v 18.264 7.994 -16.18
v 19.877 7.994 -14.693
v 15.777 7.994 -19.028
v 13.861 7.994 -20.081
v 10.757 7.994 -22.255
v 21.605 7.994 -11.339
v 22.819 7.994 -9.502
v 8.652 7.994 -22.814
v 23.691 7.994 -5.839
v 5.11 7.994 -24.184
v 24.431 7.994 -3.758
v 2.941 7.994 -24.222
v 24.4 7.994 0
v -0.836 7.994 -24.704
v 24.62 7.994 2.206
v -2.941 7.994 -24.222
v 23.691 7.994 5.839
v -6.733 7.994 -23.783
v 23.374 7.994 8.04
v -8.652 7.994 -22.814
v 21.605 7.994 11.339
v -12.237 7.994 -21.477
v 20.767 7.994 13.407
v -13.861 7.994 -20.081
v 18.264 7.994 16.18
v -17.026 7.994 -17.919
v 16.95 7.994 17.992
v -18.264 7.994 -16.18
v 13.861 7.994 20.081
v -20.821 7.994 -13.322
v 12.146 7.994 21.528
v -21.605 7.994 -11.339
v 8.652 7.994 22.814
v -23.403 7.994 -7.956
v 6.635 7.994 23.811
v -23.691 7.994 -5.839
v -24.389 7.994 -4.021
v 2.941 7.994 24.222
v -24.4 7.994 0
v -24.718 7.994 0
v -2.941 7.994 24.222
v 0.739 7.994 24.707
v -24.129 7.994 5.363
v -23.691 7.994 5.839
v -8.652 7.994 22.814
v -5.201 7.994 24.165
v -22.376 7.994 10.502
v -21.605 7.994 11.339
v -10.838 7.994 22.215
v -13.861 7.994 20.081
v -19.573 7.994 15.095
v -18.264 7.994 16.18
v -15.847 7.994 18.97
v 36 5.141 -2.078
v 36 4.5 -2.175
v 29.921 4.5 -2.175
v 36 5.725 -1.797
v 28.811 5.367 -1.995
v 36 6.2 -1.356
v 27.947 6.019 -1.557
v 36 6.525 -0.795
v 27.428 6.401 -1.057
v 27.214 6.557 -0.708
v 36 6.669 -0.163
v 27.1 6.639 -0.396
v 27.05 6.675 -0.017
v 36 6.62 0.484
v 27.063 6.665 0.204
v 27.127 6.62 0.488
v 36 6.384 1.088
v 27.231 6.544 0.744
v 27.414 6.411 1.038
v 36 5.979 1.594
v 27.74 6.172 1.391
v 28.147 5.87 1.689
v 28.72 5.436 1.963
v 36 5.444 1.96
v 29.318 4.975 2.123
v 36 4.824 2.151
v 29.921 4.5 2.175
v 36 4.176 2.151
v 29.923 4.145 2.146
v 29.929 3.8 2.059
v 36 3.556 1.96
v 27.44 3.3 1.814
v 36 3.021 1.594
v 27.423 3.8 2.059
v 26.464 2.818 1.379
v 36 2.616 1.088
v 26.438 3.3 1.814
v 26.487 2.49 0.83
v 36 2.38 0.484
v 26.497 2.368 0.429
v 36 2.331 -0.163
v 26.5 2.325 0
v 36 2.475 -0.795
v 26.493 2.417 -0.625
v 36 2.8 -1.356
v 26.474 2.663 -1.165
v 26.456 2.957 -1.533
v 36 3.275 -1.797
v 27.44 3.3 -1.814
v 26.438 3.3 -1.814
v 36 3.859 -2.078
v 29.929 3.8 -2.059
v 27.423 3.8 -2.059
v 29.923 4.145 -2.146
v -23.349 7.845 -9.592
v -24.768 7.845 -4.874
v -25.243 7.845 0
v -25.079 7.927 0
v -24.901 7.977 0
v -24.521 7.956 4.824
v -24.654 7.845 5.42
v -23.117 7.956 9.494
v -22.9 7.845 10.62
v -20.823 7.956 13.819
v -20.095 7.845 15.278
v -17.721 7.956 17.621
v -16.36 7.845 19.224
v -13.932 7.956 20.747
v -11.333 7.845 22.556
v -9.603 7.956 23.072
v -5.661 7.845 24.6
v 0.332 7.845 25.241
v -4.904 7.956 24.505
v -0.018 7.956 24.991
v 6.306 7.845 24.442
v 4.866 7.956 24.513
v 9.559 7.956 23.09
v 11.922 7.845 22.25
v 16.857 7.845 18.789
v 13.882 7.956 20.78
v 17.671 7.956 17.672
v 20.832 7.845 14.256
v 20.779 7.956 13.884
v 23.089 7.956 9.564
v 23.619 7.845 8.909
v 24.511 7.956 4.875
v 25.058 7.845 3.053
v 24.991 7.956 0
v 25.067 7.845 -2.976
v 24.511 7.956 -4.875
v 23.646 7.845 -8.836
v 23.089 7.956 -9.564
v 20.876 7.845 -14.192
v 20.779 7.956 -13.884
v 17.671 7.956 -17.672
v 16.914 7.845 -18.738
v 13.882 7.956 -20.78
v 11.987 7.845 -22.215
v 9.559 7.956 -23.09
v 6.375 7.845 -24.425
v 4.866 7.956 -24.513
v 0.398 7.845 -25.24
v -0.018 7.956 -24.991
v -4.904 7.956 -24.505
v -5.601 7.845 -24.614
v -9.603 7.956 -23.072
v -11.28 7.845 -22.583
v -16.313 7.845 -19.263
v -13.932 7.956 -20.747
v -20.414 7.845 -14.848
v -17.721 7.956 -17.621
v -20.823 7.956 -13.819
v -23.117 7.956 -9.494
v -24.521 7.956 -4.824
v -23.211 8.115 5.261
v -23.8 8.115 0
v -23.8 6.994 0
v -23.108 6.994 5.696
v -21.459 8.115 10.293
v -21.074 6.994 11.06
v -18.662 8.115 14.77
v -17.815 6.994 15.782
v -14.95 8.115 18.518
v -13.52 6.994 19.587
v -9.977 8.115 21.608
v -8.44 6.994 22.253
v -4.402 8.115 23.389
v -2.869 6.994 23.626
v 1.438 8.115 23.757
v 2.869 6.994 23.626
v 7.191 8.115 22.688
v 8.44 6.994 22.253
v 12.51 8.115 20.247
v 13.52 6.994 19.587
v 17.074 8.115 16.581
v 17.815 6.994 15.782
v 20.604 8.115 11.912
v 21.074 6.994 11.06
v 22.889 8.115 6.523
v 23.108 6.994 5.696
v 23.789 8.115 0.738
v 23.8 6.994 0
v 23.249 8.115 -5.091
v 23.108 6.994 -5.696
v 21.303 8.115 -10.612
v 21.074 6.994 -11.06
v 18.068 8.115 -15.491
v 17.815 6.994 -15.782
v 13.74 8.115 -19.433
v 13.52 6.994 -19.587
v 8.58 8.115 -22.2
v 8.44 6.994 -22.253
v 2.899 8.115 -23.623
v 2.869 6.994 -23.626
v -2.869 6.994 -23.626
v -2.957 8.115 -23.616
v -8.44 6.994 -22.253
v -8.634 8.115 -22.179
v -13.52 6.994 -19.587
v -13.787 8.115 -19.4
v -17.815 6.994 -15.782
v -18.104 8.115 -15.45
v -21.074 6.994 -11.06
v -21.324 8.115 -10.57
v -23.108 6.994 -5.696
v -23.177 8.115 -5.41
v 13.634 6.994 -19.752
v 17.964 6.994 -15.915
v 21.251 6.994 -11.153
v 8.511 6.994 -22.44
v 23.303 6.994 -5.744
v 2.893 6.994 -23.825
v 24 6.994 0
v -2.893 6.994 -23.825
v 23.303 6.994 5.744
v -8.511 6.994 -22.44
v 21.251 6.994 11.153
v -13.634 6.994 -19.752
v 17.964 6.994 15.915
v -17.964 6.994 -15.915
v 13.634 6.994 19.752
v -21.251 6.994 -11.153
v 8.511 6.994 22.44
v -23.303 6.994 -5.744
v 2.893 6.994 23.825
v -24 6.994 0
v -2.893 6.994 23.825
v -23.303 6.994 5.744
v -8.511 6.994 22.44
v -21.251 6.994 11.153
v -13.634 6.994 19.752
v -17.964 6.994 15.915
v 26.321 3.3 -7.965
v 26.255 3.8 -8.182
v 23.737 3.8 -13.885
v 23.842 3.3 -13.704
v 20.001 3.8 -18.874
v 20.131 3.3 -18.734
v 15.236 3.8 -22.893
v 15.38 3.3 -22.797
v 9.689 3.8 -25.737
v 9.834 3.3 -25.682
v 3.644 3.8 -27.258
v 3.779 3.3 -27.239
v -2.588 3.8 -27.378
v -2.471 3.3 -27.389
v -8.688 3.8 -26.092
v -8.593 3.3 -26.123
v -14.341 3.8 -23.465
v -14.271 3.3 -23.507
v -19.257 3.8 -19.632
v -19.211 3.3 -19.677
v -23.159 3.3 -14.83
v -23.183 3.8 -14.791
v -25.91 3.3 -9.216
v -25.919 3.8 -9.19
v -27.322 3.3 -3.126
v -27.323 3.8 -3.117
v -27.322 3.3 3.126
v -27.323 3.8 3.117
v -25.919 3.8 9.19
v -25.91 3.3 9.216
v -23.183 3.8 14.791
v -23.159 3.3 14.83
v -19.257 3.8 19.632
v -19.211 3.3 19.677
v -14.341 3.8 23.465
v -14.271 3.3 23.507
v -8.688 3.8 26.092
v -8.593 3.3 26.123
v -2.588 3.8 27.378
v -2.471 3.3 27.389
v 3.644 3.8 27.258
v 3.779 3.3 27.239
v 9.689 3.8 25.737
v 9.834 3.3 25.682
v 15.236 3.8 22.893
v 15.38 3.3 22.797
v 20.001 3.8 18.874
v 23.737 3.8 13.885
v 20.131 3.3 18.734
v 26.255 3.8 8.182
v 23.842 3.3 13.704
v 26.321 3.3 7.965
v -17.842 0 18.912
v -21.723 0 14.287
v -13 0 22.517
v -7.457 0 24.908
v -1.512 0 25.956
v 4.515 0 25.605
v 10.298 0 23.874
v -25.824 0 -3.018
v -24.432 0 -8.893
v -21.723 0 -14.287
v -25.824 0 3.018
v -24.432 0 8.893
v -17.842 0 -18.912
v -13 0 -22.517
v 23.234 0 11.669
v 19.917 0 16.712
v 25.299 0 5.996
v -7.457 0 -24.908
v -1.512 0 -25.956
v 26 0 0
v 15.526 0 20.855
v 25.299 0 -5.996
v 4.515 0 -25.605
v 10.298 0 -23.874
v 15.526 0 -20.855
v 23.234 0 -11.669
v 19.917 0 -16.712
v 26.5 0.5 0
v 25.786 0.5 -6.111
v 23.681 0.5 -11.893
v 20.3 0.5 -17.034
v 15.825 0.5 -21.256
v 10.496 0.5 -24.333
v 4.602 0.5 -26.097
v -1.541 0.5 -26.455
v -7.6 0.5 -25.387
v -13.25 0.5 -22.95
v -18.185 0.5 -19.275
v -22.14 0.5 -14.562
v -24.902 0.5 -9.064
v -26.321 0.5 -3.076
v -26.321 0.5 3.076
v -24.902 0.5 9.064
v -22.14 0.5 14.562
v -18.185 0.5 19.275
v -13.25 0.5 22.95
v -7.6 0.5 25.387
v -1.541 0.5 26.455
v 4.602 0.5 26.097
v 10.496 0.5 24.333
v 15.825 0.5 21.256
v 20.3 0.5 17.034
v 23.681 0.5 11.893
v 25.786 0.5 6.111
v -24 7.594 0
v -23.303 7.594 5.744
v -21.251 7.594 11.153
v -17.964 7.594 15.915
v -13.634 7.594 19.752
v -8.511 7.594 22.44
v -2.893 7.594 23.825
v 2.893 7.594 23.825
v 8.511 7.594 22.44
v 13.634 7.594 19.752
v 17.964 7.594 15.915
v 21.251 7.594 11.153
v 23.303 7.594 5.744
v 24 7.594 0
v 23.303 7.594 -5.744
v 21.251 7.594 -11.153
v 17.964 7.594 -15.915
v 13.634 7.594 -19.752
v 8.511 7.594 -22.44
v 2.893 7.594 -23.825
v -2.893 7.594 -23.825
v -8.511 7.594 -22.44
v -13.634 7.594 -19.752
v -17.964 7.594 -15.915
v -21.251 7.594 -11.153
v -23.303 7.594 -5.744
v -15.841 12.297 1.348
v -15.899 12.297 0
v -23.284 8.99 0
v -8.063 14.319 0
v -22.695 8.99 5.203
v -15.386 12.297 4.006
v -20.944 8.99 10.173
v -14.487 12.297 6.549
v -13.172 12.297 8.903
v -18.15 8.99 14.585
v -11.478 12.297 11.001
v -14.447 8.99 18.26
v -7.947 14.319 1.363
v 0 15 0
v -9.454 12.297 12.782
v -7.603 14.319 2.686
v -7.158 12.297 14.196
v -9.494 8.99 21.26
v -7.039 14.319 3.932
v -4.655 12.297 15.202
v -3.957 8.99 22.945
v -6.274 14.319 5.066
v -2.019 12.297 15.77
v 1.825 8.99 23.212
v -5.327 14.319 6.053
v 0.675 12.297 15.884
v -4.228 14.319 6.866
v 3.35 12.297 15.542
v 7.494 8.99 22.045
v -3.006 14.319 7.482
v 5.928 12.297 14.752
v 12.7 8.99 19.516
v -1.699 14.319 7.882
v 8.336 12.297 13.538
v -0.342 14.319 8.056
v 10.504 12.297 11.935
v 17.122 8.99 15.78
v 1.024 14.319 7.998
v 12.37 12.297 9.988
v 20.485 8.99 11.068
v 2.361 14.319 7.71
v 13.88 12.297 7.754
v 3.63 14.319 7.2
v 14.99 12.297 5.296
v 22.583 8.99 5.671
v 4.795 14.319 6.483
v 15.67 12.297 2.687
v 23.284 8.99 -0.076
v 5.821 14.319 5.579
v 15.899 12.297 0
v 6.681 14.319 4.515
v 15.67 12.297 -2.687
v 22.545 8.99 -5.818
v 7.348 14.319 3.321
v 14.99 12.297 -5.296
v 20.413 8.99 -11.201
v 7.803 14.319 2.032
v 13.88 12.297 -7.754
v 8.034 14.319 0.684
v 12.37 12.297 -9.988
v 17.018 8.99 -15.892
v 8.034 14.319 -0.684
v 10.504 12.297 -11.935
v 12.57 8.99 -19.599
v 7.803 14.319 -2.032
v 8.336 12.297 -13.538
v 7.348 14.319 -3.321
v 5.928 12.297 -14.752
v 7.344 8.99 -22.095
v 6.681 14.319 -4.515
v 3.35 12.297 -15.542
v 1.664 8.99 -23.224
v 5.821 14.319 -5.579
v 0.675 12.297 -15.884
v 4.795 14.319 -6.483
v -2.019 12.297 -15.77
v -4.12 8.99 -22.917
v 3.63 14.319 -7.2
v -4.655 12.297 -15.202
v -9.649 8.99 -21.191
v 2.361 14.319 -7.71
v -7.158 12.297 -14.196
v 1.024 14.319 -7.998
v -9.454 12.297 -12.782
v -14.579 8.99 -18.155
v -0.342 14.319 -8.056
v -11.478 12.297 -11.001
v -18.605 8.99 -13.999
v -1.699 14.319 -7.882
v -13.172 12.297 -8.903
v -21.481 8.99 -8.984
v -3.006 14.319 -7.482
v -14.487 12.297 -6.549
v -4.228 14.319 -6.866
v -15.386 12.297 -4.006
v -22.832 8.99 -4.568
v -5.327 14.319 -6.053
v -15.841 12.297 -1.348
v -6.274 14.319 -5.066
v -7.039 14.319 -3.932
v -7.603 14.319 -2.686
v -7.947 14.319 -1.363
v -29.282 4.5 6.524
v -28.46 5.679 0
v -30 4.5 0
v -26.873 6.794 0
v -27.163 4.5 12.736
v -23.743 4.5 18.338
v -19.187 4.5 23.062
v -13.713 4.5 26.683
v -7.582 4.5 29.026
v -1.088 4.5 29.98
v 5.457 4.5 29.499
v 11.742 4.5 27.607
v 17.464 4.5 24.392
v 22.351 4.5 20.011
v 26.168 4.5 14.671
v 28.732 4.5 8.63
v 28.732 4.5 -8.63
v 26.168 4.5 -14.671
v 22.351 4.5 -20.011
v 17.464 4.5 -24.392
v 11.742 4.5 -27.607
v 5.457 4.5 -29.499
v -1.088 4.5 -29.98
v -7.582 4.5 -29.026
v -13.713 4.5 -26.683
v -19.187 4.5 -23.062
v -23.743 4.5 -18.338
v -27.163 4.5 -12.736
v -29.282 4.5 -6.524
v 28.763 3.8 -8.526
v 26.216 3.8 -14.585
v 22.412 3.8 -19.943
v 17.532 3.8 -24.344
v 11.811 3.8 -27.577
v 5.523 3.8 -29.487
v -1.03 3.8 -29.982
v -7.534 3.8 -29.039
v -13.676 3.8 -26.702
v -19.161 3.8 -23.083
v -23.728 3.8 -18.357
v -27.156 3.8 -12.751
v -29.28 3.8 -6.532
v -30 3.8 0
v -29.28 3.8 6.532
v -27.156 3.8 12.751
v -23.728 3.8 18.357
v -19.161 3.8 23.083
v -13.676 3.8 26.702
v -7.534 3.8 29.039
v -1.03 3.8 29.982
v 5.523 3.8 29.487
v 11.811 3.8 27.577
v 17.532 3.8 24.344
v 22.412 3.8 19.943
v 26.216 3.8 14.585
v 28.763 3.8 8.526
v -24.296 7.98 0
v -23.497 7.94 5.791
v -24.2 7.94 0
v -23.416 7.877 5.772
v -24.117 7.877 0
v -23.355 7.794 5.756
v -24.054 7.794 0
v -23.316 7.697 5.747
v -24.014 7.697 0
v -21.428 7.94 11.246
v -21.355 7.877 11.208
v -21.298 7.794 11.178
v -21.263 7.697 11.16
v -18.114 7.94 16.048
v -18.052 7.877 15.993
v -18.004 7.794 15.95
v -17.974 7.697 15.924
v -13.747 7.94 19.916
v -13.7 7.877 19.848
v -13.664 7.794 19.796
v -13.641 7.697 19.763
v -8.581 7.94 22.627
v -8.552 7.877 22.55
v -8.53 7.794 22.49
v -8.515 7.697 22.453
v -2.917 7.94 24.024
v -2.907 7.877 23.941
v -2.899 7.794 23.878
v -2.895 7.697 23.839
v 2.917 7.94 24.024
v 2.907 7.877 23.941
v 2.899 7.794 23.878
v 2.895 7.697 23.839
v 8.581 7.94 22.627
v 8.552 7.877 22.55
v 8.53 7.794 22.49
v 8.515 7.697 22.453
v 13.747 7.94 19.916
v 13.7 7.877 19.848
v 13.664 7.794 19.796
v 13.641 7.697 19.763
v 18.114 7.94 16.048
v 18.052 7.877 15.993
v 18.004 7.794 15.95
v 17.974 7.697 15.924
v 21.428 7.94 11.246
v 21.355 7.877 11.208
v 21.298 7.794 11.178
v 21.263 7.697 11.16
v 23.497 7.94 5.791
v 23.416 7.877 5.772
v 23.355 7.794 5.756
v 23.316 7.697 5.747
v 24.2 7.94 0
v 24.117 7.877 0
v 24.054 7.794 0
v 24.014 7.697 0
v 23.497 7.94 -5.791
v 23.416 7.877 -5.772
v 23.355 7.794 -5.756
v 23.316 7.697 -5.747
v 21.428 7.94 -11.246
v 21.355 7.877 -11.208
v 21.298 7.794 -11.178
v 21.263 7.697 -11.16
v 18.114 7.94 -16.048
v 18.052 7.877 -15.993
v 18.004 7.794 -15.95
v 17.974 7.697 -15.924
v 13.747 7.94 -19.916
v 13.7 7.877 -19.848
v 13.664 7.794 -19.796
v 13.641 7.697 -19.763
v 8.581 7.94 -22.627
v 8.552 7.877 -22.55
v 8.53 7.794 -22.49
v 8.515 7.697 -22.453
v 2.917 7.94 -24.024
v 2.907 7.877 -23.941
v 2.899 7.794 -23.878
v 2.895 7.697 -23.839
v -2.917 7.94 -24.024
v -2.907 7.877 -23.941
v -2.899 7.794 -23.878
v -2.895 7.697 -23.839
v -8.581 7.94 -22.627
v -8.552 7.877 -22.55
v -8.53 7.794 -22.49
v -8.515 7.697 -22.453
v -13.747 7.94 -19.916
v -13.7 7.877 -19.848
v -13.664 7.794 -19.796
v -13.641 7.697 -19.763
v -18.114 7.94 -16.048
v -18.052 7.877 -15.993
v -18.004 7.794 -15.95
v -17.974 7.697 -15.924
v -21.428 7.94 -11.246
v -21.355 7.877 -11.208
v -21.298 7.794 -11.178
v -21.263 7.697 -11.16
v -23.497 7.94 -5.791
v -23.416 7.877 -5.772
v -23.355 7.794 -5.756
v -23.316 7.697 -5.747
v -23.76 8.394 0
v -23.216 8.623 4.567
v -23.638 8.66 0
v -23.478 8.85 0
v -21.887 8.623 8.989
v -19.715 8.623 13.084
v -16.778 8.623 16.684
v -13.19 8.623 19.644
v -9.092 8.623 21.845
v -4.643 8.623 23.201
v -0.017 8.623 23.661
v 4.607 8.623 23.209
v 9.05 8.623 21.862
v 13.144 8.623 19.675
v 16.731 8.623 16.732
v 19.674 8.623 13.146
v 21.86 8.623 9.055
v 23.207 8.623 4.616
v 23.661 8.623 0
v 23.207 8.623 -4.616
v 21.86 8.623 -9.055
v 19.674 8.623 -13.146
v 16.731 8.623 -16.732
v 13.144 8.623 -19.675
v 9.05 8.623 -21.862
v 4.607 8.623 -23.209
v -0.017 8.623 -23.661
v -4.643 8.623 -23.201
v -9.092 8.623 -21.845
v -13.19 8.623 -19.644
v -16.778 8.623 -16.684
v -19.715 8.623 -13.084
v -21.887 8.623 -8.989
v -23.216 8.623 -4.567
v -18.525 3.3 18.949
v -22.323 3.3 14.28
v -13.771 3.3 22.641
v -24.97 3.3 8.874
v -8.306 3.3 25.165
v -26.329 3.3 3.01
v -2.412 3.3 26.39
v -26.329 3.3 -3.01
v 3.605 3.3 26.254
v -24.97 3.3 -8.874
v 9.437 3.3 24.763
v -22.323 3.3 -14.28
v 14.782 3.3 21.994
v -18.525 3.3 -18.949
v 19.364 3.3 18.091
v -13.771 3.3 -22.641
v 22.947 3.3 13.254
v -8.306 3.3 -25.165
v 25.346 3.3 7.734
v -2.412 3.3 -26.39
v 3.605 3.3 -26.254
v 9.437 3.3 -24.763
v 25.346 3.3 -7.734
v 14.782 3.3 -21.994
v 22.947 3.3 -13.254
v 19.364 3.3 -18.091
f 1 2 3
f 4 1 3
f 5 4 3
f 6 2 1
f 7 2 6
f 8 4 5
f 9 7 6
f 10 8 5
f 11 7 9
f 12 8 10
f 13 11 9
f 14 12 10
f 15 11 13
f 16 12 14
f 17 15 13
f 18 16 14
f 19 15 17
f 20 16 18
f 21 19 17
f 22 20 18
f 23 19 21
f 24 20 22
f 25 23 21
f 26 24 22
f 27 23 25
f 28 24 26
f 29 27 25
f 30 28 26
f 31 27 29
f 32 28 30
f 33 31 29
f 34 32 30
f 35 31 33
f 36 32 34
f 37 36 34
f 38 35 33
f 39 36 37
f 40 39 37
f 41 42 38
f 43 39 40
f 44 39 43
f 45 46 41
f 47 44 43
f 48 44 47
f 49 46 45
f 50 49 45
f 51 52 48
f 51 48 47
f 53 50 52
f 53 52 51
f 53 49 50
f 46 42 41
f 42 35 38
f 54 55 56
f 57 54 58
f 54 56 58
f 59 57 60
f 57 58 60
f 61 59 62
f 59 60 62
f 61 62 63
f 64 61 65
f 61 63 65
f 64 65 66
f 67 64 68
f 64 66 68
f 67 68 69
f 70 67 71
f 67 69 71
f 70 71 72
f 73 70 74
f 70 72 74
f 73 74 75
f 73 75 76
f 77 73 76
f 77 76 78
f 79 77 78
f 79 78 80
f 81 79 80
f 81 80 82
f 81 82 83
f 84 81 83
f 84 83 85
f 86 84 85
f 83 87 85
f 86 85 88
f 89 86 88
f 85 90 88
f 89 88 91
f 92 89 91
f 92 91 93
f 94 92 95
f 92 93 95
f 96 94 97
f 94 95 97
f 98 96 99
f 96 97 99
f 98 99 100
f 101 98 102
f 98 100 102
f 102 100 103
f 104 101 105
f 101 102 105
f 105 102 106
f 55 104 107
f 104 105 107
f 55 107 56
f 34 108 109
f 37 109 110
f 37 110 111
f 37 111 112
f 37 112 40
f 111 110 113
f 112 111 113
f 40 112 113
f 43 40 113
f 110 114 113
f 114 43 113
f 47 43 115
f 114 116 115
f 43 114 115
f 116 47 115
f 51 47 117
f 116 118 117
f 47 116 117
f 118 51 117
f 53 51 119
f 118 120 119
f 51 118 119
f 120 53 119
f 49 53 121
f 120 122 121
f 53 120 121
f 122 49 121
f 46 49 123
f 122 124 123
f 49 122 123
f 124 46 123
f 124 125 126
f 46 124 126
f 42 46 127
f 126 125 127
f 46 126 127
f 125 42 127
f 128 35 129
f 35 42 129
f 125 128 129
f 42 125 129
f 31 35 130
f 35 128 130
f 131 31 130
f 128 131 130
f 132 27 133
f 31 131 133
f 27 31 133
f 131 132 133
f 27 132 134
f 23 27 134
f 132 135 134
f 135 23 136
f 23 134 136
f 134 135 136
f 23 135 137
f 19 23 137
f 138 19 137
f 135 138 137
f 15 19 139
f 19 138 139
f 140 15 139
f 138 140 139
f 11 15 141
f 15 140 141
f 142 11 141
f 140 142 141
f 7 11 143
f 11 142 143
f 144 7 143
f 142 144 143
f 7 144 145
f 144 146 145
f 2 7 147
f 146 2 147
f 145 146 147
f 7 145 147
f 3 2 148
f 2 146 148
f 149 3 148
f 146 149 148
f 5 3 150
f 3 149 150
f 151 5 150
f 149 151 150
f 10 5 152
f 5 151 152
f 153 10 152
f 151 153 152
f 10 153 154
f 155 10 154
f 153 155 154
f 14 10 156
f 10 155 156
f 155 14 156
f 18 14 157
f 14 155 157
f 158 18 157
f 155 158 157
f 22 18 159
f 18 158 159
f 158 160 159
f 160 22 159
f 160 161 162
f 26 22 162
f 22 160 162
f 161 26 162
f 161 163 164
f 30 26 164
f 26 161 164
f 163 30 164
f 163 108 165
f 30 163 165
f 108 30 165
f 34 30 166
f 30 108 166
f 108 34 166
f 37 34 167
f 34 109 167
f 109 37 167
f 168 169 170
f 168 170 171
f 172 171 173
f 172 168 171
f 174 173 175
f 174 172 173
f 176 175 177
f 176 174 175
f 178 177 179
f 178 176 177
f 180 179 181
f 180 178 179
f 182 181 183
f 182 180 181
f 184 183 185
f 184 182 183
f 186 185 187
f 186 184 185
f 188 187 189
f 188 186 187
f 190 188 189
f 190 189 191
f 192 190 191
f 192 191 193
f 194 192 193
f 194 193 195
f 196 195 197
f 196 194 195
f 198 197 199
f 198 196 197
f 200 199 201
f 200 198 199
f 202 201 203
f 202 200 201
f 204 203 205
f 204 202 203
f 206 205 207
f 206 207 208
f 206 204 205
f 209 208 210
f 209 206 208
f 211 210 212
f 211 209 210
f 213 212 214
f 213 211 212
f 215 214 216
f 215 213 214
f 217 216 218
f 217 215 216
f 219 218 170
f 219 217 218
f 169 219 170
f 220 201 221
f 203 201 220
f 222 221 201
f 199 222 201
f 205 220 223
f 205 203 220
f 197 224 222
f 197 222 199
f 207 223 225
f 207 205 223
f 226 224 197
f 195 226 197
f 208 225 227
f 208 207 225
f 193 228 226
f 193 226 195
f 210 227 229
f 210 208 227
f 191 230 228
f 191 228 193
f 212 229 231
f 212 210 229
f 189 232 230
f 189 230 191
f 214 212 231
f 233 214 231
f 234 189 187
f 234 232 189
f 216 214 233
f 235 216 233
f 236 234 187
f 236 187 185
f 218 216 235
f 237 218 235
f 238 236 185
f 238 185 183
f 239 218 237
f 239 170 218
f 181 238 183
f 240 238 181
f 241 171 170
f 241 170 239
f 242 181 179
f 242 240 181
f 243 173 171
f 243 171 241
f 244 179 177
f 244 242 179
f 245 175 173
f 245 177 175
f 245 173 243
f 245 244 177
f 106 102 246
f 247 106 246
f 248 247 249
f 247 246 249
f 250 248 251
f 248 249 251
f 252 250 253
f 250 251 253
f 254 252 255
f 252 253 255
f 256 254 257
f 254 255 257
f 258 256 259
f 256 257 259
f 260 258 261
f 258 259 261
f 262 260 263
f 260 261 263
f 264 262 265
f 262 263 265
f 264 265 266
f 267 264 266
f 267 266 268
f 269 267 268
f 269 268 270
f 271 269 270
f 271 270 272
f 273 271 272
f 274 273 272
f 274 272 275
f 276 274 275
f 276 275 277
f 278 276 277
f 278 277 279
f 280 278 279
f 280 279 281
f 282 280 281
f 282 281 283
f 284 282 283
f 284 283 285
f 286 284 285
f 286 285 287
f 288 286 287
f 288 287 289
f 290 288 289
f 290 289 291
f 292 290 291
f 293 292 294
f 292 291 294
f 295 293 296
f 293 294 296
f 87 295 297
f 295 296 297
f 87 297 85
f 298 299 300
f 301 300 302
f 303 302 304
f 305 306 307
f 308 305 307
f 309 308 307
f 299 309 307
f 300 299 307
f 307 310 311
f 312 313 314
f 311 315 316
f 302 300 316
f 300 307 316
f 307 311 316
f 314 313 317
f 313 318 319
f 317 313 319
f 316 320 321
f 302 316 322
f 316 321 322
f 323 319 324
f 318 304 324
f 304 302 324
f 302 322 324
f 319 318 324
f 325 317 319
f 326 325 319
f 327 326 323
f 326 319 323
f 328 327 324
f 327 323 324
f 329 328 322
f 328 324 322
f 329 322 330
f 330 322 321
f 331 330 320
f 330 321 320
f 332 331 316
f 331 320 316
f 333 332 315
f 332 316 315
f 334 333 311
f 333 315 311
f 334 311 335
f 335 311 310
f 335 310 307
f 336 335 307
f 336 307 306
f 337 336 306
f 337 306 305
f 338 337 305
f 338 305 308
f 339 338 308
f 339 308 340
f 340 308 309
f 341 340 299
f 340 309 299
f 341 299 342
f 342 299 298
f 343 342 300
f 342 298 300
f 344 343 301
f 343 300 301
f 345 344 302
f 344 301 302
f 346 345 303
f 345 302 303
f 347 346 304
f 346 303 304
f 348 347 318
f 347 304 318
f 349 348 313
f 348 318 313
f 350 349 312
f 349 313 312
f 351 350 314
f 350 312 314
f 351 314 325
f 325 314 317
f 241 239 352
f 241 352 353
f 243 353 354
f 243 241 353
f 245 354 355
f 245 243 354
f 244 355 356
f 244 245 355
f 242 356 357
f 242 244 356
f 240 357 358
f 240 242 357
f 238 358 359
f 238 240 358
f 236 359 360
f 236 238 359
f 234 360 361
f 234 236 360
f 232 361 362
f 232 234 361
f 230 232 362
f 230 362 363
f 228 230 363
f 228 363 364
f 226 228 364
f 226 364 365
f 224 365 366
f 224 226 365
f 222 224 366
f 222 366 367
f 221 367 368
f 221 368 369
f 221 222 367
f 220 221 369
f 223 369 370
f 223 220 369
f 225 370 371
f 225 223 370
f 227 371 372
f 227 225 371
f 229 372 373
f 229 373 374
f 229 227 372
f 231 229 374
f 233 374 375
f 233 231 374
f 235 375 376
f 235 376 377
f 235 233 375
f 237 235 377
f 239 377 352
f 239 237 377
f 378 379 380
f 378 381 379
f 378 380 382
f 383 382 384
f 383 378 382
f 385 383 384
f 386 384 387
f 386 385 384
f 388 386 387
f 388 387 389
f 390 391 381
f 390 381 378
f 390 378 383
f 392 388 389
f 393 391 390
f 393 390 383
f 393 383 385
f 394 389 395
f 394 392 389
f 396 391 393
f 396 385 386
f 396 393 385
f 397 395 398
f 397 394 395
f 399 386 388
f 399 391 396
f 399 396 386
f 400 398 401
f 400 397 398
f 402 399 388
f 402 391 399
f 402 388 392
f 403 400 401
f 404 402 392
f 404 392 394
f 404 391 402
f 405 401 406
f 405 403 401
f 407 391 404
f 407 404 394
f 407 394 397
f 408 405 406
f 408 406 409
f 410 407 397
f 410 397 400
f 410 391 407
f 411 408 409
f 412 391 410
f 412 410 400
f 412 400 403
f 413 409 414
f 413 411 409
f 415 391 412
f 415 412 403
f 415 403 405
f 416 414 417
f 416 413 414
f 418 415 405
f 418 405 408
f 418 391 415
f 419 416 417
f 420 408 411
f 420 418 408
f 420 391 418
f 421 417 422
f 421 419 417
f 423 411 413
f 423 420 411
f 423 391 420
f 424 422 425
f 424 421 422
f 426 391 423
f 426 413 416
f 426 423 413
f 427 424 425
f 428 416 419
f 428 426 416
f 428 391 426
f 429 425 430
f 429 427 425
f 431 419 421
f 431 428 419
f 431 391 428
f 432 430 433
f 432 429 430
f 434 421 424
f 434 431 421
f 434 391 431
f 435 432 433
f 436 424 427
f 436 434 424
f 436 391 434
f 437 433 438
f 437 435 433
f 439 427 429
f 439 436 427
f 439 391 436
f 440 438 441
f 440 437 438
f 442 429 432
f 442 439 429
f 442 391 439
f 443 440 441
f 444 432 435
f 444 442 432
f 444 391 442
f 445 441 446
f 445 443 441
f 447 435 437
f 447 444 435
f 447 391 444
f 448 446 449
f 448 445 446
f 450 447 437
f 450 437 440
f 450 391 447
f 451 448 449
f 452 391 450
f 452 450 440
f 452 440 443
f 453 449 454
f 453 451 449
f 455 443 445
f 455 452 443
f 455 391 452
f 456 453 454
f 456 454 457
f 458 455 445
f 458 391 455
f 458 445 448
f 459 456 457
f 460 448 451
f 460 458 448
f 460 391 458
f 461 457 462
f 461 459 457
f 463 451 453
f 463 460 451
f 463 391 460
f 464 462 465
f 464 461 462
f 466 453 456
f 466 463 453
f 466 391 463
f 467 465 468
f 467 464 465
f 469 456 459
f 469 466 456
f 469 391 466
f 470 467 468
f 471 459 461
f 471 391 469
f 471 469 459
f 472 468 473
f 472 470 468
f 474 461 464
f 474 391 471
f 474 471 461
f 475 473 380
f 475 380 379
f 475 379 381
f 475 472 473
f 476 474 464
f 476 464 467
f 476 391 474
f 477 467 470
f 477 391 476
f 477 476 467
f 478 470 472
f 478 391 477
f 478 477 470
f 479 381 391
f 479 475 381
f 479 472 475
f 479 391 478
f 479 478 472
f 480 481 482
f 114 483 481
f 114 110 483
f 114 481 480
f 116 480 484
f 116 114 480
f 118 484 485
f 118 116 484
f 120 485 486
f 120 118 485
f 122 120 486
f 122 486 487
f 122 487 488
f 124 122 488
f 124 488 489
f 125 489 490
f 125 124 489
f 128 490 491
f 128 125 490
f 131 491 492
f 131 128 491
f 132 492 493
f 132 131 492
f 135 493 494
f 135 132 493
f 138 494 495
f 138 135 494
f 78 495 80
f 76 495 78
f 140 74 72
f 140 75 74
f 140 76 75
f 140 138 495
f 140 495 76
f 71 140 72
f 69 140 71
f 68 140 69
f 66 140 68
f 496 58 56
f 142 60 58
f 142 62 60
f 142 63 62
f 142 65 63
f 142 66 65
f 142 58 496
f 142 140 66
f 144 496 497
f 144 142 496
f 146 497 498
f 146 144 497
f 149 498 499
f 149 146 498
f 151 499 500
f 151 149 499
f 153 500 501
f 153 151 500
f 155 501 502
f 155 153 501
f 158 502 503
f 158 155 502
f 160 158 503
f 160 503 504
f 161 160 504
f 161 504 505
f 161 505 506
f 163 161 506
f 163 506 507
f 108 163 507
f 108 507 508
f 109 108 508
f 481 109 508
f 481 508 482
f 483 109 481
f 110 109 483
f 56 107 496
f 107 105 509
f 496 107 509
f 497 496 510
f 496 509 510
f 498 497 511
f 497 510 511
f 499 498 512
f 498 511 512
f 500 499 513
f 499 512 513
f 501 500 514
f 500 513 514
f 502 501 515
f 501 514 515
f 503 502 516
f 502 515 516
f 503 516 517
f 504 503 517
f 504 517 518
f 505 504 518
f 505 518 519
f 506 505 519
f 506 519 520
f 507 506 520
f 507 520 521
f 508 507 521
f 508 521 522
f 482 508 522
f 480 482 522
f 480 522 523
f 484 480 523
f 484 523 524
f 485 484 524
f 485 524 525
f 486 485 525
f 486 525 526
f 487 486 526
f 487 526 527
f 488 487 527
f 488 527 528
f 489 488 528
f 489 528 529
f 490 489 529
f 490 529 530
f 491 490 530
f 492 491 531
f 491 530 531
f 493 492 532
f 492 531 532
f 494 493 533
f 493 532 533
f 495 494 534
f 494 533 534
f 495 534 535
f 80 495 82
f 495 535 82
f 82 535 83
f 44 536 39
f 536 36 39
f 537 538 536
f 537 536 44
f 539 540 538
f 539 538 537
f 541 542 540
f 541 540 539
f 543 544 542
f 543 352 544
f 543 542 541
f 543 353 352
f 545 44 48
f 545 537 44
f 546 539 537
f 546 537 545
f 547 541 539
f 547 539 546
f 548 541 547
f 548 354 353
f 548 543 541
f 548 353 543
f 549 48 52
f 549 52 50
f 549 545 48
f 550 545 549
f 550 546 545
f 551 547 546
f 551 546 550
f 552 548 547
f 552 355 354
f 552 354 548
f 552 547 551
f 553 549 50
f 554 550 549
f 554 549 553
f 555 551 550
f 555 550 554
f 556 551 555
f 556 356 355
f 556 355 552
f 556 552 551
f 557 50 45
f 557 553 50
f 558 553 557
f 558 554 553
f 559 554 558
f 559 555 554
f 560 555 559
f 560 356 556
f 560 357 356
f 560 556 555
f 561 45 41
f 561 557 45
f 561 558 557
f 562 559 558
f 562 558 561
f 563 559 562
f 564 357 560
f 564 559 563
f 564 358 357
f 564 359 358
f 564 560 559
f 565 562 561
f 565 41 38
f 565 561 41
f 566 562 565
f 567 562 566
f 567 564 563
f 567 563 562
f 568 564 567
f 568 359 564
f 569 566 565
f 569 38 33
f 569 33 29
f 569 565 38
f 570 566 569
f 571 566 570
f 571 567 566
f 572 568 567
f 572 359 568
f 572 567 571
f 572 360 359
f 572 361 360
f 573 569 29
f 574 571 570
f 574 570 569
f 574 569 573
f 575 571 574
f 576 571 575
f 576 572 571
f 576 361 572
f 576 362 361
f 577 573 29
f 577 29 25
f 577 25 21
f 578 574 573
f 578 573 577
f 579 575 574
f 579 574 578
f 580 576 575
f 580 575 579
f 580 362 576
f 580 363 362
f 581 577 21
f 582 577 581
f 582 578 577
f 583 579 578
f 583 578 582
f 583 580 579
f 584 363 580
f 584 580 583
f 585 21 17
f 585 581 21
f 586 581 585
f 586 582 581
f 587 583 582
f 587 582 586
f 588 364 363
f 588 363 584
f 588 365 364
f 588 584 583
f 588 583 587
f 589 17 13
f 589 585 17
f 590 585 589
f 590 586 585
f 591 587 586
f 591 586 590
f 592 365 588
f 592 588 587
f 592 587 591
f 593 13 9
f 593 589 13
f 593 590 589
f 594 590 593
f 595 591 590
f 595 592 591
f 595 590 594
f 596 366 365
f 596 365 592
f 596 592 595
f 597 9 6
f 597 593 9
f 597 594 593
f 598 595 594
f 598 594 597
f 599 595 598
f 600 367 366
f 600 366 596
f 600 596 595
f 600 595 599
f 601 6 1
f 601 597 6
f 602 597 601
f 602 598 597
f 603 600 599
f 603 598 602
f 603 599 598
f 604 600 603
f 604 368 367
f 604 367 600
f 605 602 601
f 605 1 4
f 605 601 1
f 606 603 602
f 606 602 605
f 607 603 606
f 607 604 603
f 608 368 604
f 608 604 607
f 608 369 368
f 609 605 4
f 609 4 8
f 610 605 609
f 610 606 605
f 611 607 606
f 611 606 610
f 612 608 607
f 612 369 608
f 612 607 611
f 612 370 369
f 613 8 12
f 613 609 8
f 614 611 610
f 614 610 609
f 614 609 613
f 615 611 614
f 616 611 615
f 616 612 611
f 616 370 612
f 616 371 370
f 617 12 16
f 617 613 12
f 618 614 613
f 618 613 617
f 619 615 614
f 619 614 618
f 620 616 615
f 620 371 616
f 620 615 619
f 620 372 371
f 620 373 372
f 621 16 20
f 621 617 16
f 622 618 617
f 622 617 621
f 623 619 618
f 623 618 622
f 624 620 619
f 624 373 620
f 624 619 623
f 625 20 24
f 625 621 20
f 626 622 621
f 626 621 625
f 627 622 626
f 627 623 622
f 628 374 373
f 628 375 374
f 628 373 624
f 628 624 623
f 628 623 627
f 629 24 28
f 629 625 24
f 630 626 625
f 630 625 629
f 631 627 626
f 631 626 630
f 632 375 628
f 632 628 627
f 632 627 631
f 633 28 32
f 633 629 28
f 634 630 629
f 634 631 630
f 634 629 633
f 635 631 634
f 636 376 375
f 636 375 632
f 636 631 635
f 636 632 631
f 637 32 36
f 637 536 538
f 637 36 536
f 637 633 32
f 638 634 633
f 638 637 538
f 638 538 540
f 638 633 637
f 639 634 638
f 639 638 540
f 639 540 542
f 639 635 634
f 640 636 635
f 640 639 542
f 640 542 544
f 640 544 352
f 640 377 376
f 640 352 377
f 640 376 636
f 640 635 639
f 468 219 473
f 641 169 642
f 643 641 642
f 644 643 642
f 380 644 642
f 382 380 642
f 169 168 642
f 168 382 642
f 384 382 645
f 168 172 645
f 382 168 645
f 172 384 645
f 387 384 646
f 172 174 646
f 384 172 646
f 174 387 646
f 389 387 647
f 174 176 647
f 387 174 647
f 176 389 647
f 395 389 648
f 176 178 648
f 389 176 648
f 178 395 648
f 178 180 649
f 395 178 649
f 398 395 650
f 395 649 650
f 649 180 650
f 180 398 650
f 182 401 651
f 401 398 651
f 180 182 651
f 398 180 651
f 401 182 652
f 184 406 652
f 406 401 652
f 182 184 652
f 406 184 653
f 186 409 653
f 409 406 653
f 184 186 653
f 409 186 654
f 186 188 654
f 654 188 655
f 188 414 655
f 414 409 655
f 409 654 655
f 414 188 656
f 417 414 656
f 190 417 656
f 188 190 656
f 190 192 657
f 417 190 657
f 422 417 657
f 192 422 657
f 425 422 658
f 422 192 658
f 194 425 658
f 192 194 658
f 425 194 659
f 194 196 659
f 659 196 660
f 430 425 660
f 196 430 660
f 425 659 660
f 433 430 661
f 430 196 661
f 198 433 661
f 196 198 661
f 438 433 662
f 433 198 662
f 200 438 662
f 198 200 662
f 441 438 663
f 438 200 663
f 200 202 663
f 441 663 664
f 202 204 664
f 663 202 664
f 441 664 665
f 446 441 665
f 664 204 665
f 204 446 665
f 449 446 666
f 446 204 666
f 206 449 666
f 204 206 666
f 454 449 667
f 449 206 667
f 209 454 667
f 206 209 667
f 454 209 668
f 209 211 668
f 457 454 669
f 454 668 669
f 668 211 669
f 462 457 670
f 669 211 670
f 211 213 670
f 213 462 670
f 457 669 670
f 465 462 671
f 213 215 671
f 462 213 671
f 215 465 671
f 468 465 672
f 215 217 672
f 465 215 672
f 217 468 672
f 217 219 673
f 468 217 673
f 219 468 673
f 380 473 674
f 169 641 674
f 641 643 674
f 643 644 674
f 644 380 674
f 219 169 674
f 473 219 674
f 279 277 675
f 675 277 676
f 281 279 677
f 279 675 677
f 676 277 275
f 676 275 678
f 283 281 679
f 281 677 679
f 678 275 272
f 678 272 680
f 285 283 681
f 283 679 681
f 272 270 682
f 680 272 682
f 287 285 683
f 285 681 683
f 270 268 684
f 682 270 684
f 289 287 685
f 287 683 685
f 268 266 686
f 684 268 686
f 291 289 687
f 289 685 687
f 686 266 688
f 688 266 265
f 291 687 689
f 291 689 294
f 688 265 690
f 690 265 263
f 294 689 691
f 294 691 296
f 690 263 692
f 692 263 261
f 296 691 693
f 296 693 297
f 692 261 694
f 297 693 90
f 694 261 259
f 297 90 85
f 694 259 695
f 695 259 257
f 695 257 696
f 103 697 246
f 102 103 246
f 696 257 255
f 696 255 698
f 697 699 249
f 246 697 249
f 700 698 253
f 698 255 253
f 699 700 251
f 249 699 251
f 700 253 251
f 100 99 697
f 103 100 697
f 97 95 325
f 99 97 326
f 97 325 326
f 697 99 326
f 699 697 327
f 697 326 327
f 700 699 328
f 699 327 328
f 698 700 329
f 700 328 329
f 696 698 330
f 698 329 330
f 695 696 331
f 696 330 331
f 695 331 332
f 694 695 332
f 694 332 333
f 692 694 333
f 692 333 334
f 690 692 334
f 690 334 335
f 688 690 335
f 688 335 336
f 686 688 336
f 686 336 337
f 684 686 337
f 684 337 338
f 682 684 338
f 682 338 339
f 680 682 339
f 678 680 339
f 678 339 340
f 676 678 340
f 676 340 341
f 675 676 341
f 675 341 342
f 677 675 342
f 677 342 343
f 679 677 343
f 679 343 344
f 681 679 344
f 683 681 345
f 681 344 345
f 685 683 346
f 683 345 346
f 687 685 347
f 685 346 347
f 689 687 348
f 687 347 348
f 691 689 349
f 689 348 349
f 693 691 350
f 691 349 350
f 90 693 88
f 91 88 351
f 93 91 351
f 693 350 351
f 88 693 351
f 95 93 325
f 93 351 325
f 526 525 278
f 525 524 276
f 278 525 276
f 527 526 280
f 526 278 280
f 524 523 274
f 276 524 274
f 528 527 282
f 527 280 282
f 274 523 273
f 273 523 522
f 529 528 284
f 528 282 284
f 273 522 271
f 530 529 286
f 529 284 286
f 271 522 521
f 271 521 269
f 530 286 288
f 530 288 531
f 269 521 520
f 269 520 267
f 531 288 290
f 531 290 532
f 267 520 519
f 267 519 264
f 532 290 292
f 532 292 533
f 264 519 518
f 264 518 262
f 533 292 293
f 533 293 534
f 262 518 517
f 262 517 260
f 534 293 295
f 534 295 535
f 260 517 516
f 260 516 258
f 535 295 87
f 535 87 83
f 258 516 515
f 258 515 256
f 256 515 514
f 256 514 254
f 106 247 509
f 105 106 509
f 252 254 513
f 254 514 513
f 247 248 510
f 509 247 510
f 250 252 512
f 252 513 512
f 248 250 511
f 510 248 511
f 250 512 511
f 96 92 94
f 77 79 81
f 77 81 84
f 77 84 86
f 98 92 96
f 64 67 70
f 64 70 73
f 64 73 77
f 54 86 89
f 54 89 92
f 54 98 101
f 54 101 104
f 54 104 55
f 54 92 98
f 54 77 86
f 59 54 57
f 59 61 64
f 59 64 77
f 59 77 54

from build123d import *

# Parameters (mm, degrees)
SKETCH_1_R           = 30
EXTRUDE_1_DEPTH      = 15
SKETCH_2_OUTSIDE_W   = 79.234
SKETCH_2_OUTSIDE_H   = 79.234
SKETCH_2_OUTSIDE_R   = 27.5
CUT_EXTRUDE_1_DEPTH  = 3.8
SKETCH_2_3_OUTSIDE_W = 79.234
SKETCH_2_3_OUTSIDE_H = 79.234
SKETCH_2_3_OUTSIDE_R = 26.5
CUT_EXTRUDE_2_DEPTH  = 3.3
EXTRUDE_2_DEPTH      = 36
CHAMFER_1_SIZE       = 0.5
FILLET_1_R           = 1
FILLET_2_R           = 0.4


with BuildPart() as part:
    # Эскиз1 → Бобышка-Вытянуть1 (new body)
    with BuildSketch(Plane(origin=(0, 0, 0), x_dir=(1, 0, 0), z_dir=(0, 1, 0))):
        Circle(SKETCH_1_R)
    extrude(amount=EXTRUDE_1_DEPTH)

    # Эскиз2 outside → Вырез-Вытянуть1 (cut)
    with BuildSketch(Plane(origin=(0, 0, 0), x_dir=(1, 0, 0), z_dir=(0, 1, 0))):
        Rectangle(SKETCH_2_OUTSIDE_W, SKETCH_2_OUTSIDE_H)
        Circle(SKETCH_2_OUTSIDE_R, mode=Mode.SUBTRACT)
    extrude(amount=CUT_EXTRUDE_1_DEPTH, mode=Mode.SUBTRACT)

    # Эскиз2<3> outside → Вырез-Вытянуть2 (cut)
    with BuildSketch(Plane(origin=(0, 0, 0), x_dir=(1, 0, 0), z_dir=(0, 1, 0))):
        Rectangle(SKETCH_2_3_OUTSIDE_W, SKETCH_2_3_OUTSIDE_H)
        Circle(SKETCH_2_3_OUTSIDE_R, mode=Mode.SUBTRACT)
    extrude(amount=CUT_EXTRUDE_2_DEPTH, mode=Mode.SUBTRACT)

    # Эскиз3 → Вырез-Повернуть1 (revolve, cut)
    with BuildSketch(Plane.XY):
        with BuildLine():
            Line((-42.194966184, 4.5), (-30, 4.5))
            ThreePointArc((-30, 4.5), (-27.555432596, 6.326286214), (-25, 7.993917882))
            Line((-25, 7.993917882), (-24, 7.993917882))
            Line((-24, 7.993917882), (-24, 6.993917882))
            Line((-24, 6.993917882), (-23.8, 6.993917882))
            Line((-23.8, 6.993917882), (-23.8, 8.700239193))
            ThreePointArc((-23.8, 8.700239193), (-12.309823173, 13.398399257), (0, 15))
            Line((0, 15), (0, 24.071462315))
            Line((0, 24.071462315), (-42.194966184, 24.071462315))
            Line((-42.194966184, 24.071462315), (-42.194966184, 4.5))
        make_face()
    revolve(axis=Axis((0, 0, 0), (0, 1, 0)), mode=Mode.SUBTRACT)

    # Эскиз4 → Бобышка-Вытянуть2 (add)
    with BuildSketch(Plane(origin=(0, 0, 0), x_dir=(0, 0, -1), z_dir=(1, 0, 0))):
        with BuildLine():
            ThreePointArc((0, 2.325), (1.537957249, 2.962042751), (2.175, 4.5))
            ThreePointArc((2.175, 4.5), (-1.537957249, 6.037957249), (0, 2.325))
        make_face()
    extrude(amount=EXTRUDE_2_DEPTH)

    # Фаска1
    chamfer_1_edges = [part.edges().sort_by_distance(p)[0] for p in [
        (-26.5, 0, 0),
    ]]
    chamfer(chamfer_1_edges, length=CHAMFER_1_SIZE)

    # Скругление1
    fillet_1_edges = [part.edges().sort_by_distance(p)[0] for p in [
        (23.8, 8.700239193, 0),
        (25, 7.993917882, 0),
    ]]
    fillet(fillet_1_edges, radius=FILLET_1_R)

    # Скругление2
    fillet_2_edges = [part.edges().sort_by_distance(p)[0] for p in [
        (24, 7.993917882, 0),
    ]]
    fillet(fillet_2_edges, radius=FILLET_2_R)


solid = part.part
